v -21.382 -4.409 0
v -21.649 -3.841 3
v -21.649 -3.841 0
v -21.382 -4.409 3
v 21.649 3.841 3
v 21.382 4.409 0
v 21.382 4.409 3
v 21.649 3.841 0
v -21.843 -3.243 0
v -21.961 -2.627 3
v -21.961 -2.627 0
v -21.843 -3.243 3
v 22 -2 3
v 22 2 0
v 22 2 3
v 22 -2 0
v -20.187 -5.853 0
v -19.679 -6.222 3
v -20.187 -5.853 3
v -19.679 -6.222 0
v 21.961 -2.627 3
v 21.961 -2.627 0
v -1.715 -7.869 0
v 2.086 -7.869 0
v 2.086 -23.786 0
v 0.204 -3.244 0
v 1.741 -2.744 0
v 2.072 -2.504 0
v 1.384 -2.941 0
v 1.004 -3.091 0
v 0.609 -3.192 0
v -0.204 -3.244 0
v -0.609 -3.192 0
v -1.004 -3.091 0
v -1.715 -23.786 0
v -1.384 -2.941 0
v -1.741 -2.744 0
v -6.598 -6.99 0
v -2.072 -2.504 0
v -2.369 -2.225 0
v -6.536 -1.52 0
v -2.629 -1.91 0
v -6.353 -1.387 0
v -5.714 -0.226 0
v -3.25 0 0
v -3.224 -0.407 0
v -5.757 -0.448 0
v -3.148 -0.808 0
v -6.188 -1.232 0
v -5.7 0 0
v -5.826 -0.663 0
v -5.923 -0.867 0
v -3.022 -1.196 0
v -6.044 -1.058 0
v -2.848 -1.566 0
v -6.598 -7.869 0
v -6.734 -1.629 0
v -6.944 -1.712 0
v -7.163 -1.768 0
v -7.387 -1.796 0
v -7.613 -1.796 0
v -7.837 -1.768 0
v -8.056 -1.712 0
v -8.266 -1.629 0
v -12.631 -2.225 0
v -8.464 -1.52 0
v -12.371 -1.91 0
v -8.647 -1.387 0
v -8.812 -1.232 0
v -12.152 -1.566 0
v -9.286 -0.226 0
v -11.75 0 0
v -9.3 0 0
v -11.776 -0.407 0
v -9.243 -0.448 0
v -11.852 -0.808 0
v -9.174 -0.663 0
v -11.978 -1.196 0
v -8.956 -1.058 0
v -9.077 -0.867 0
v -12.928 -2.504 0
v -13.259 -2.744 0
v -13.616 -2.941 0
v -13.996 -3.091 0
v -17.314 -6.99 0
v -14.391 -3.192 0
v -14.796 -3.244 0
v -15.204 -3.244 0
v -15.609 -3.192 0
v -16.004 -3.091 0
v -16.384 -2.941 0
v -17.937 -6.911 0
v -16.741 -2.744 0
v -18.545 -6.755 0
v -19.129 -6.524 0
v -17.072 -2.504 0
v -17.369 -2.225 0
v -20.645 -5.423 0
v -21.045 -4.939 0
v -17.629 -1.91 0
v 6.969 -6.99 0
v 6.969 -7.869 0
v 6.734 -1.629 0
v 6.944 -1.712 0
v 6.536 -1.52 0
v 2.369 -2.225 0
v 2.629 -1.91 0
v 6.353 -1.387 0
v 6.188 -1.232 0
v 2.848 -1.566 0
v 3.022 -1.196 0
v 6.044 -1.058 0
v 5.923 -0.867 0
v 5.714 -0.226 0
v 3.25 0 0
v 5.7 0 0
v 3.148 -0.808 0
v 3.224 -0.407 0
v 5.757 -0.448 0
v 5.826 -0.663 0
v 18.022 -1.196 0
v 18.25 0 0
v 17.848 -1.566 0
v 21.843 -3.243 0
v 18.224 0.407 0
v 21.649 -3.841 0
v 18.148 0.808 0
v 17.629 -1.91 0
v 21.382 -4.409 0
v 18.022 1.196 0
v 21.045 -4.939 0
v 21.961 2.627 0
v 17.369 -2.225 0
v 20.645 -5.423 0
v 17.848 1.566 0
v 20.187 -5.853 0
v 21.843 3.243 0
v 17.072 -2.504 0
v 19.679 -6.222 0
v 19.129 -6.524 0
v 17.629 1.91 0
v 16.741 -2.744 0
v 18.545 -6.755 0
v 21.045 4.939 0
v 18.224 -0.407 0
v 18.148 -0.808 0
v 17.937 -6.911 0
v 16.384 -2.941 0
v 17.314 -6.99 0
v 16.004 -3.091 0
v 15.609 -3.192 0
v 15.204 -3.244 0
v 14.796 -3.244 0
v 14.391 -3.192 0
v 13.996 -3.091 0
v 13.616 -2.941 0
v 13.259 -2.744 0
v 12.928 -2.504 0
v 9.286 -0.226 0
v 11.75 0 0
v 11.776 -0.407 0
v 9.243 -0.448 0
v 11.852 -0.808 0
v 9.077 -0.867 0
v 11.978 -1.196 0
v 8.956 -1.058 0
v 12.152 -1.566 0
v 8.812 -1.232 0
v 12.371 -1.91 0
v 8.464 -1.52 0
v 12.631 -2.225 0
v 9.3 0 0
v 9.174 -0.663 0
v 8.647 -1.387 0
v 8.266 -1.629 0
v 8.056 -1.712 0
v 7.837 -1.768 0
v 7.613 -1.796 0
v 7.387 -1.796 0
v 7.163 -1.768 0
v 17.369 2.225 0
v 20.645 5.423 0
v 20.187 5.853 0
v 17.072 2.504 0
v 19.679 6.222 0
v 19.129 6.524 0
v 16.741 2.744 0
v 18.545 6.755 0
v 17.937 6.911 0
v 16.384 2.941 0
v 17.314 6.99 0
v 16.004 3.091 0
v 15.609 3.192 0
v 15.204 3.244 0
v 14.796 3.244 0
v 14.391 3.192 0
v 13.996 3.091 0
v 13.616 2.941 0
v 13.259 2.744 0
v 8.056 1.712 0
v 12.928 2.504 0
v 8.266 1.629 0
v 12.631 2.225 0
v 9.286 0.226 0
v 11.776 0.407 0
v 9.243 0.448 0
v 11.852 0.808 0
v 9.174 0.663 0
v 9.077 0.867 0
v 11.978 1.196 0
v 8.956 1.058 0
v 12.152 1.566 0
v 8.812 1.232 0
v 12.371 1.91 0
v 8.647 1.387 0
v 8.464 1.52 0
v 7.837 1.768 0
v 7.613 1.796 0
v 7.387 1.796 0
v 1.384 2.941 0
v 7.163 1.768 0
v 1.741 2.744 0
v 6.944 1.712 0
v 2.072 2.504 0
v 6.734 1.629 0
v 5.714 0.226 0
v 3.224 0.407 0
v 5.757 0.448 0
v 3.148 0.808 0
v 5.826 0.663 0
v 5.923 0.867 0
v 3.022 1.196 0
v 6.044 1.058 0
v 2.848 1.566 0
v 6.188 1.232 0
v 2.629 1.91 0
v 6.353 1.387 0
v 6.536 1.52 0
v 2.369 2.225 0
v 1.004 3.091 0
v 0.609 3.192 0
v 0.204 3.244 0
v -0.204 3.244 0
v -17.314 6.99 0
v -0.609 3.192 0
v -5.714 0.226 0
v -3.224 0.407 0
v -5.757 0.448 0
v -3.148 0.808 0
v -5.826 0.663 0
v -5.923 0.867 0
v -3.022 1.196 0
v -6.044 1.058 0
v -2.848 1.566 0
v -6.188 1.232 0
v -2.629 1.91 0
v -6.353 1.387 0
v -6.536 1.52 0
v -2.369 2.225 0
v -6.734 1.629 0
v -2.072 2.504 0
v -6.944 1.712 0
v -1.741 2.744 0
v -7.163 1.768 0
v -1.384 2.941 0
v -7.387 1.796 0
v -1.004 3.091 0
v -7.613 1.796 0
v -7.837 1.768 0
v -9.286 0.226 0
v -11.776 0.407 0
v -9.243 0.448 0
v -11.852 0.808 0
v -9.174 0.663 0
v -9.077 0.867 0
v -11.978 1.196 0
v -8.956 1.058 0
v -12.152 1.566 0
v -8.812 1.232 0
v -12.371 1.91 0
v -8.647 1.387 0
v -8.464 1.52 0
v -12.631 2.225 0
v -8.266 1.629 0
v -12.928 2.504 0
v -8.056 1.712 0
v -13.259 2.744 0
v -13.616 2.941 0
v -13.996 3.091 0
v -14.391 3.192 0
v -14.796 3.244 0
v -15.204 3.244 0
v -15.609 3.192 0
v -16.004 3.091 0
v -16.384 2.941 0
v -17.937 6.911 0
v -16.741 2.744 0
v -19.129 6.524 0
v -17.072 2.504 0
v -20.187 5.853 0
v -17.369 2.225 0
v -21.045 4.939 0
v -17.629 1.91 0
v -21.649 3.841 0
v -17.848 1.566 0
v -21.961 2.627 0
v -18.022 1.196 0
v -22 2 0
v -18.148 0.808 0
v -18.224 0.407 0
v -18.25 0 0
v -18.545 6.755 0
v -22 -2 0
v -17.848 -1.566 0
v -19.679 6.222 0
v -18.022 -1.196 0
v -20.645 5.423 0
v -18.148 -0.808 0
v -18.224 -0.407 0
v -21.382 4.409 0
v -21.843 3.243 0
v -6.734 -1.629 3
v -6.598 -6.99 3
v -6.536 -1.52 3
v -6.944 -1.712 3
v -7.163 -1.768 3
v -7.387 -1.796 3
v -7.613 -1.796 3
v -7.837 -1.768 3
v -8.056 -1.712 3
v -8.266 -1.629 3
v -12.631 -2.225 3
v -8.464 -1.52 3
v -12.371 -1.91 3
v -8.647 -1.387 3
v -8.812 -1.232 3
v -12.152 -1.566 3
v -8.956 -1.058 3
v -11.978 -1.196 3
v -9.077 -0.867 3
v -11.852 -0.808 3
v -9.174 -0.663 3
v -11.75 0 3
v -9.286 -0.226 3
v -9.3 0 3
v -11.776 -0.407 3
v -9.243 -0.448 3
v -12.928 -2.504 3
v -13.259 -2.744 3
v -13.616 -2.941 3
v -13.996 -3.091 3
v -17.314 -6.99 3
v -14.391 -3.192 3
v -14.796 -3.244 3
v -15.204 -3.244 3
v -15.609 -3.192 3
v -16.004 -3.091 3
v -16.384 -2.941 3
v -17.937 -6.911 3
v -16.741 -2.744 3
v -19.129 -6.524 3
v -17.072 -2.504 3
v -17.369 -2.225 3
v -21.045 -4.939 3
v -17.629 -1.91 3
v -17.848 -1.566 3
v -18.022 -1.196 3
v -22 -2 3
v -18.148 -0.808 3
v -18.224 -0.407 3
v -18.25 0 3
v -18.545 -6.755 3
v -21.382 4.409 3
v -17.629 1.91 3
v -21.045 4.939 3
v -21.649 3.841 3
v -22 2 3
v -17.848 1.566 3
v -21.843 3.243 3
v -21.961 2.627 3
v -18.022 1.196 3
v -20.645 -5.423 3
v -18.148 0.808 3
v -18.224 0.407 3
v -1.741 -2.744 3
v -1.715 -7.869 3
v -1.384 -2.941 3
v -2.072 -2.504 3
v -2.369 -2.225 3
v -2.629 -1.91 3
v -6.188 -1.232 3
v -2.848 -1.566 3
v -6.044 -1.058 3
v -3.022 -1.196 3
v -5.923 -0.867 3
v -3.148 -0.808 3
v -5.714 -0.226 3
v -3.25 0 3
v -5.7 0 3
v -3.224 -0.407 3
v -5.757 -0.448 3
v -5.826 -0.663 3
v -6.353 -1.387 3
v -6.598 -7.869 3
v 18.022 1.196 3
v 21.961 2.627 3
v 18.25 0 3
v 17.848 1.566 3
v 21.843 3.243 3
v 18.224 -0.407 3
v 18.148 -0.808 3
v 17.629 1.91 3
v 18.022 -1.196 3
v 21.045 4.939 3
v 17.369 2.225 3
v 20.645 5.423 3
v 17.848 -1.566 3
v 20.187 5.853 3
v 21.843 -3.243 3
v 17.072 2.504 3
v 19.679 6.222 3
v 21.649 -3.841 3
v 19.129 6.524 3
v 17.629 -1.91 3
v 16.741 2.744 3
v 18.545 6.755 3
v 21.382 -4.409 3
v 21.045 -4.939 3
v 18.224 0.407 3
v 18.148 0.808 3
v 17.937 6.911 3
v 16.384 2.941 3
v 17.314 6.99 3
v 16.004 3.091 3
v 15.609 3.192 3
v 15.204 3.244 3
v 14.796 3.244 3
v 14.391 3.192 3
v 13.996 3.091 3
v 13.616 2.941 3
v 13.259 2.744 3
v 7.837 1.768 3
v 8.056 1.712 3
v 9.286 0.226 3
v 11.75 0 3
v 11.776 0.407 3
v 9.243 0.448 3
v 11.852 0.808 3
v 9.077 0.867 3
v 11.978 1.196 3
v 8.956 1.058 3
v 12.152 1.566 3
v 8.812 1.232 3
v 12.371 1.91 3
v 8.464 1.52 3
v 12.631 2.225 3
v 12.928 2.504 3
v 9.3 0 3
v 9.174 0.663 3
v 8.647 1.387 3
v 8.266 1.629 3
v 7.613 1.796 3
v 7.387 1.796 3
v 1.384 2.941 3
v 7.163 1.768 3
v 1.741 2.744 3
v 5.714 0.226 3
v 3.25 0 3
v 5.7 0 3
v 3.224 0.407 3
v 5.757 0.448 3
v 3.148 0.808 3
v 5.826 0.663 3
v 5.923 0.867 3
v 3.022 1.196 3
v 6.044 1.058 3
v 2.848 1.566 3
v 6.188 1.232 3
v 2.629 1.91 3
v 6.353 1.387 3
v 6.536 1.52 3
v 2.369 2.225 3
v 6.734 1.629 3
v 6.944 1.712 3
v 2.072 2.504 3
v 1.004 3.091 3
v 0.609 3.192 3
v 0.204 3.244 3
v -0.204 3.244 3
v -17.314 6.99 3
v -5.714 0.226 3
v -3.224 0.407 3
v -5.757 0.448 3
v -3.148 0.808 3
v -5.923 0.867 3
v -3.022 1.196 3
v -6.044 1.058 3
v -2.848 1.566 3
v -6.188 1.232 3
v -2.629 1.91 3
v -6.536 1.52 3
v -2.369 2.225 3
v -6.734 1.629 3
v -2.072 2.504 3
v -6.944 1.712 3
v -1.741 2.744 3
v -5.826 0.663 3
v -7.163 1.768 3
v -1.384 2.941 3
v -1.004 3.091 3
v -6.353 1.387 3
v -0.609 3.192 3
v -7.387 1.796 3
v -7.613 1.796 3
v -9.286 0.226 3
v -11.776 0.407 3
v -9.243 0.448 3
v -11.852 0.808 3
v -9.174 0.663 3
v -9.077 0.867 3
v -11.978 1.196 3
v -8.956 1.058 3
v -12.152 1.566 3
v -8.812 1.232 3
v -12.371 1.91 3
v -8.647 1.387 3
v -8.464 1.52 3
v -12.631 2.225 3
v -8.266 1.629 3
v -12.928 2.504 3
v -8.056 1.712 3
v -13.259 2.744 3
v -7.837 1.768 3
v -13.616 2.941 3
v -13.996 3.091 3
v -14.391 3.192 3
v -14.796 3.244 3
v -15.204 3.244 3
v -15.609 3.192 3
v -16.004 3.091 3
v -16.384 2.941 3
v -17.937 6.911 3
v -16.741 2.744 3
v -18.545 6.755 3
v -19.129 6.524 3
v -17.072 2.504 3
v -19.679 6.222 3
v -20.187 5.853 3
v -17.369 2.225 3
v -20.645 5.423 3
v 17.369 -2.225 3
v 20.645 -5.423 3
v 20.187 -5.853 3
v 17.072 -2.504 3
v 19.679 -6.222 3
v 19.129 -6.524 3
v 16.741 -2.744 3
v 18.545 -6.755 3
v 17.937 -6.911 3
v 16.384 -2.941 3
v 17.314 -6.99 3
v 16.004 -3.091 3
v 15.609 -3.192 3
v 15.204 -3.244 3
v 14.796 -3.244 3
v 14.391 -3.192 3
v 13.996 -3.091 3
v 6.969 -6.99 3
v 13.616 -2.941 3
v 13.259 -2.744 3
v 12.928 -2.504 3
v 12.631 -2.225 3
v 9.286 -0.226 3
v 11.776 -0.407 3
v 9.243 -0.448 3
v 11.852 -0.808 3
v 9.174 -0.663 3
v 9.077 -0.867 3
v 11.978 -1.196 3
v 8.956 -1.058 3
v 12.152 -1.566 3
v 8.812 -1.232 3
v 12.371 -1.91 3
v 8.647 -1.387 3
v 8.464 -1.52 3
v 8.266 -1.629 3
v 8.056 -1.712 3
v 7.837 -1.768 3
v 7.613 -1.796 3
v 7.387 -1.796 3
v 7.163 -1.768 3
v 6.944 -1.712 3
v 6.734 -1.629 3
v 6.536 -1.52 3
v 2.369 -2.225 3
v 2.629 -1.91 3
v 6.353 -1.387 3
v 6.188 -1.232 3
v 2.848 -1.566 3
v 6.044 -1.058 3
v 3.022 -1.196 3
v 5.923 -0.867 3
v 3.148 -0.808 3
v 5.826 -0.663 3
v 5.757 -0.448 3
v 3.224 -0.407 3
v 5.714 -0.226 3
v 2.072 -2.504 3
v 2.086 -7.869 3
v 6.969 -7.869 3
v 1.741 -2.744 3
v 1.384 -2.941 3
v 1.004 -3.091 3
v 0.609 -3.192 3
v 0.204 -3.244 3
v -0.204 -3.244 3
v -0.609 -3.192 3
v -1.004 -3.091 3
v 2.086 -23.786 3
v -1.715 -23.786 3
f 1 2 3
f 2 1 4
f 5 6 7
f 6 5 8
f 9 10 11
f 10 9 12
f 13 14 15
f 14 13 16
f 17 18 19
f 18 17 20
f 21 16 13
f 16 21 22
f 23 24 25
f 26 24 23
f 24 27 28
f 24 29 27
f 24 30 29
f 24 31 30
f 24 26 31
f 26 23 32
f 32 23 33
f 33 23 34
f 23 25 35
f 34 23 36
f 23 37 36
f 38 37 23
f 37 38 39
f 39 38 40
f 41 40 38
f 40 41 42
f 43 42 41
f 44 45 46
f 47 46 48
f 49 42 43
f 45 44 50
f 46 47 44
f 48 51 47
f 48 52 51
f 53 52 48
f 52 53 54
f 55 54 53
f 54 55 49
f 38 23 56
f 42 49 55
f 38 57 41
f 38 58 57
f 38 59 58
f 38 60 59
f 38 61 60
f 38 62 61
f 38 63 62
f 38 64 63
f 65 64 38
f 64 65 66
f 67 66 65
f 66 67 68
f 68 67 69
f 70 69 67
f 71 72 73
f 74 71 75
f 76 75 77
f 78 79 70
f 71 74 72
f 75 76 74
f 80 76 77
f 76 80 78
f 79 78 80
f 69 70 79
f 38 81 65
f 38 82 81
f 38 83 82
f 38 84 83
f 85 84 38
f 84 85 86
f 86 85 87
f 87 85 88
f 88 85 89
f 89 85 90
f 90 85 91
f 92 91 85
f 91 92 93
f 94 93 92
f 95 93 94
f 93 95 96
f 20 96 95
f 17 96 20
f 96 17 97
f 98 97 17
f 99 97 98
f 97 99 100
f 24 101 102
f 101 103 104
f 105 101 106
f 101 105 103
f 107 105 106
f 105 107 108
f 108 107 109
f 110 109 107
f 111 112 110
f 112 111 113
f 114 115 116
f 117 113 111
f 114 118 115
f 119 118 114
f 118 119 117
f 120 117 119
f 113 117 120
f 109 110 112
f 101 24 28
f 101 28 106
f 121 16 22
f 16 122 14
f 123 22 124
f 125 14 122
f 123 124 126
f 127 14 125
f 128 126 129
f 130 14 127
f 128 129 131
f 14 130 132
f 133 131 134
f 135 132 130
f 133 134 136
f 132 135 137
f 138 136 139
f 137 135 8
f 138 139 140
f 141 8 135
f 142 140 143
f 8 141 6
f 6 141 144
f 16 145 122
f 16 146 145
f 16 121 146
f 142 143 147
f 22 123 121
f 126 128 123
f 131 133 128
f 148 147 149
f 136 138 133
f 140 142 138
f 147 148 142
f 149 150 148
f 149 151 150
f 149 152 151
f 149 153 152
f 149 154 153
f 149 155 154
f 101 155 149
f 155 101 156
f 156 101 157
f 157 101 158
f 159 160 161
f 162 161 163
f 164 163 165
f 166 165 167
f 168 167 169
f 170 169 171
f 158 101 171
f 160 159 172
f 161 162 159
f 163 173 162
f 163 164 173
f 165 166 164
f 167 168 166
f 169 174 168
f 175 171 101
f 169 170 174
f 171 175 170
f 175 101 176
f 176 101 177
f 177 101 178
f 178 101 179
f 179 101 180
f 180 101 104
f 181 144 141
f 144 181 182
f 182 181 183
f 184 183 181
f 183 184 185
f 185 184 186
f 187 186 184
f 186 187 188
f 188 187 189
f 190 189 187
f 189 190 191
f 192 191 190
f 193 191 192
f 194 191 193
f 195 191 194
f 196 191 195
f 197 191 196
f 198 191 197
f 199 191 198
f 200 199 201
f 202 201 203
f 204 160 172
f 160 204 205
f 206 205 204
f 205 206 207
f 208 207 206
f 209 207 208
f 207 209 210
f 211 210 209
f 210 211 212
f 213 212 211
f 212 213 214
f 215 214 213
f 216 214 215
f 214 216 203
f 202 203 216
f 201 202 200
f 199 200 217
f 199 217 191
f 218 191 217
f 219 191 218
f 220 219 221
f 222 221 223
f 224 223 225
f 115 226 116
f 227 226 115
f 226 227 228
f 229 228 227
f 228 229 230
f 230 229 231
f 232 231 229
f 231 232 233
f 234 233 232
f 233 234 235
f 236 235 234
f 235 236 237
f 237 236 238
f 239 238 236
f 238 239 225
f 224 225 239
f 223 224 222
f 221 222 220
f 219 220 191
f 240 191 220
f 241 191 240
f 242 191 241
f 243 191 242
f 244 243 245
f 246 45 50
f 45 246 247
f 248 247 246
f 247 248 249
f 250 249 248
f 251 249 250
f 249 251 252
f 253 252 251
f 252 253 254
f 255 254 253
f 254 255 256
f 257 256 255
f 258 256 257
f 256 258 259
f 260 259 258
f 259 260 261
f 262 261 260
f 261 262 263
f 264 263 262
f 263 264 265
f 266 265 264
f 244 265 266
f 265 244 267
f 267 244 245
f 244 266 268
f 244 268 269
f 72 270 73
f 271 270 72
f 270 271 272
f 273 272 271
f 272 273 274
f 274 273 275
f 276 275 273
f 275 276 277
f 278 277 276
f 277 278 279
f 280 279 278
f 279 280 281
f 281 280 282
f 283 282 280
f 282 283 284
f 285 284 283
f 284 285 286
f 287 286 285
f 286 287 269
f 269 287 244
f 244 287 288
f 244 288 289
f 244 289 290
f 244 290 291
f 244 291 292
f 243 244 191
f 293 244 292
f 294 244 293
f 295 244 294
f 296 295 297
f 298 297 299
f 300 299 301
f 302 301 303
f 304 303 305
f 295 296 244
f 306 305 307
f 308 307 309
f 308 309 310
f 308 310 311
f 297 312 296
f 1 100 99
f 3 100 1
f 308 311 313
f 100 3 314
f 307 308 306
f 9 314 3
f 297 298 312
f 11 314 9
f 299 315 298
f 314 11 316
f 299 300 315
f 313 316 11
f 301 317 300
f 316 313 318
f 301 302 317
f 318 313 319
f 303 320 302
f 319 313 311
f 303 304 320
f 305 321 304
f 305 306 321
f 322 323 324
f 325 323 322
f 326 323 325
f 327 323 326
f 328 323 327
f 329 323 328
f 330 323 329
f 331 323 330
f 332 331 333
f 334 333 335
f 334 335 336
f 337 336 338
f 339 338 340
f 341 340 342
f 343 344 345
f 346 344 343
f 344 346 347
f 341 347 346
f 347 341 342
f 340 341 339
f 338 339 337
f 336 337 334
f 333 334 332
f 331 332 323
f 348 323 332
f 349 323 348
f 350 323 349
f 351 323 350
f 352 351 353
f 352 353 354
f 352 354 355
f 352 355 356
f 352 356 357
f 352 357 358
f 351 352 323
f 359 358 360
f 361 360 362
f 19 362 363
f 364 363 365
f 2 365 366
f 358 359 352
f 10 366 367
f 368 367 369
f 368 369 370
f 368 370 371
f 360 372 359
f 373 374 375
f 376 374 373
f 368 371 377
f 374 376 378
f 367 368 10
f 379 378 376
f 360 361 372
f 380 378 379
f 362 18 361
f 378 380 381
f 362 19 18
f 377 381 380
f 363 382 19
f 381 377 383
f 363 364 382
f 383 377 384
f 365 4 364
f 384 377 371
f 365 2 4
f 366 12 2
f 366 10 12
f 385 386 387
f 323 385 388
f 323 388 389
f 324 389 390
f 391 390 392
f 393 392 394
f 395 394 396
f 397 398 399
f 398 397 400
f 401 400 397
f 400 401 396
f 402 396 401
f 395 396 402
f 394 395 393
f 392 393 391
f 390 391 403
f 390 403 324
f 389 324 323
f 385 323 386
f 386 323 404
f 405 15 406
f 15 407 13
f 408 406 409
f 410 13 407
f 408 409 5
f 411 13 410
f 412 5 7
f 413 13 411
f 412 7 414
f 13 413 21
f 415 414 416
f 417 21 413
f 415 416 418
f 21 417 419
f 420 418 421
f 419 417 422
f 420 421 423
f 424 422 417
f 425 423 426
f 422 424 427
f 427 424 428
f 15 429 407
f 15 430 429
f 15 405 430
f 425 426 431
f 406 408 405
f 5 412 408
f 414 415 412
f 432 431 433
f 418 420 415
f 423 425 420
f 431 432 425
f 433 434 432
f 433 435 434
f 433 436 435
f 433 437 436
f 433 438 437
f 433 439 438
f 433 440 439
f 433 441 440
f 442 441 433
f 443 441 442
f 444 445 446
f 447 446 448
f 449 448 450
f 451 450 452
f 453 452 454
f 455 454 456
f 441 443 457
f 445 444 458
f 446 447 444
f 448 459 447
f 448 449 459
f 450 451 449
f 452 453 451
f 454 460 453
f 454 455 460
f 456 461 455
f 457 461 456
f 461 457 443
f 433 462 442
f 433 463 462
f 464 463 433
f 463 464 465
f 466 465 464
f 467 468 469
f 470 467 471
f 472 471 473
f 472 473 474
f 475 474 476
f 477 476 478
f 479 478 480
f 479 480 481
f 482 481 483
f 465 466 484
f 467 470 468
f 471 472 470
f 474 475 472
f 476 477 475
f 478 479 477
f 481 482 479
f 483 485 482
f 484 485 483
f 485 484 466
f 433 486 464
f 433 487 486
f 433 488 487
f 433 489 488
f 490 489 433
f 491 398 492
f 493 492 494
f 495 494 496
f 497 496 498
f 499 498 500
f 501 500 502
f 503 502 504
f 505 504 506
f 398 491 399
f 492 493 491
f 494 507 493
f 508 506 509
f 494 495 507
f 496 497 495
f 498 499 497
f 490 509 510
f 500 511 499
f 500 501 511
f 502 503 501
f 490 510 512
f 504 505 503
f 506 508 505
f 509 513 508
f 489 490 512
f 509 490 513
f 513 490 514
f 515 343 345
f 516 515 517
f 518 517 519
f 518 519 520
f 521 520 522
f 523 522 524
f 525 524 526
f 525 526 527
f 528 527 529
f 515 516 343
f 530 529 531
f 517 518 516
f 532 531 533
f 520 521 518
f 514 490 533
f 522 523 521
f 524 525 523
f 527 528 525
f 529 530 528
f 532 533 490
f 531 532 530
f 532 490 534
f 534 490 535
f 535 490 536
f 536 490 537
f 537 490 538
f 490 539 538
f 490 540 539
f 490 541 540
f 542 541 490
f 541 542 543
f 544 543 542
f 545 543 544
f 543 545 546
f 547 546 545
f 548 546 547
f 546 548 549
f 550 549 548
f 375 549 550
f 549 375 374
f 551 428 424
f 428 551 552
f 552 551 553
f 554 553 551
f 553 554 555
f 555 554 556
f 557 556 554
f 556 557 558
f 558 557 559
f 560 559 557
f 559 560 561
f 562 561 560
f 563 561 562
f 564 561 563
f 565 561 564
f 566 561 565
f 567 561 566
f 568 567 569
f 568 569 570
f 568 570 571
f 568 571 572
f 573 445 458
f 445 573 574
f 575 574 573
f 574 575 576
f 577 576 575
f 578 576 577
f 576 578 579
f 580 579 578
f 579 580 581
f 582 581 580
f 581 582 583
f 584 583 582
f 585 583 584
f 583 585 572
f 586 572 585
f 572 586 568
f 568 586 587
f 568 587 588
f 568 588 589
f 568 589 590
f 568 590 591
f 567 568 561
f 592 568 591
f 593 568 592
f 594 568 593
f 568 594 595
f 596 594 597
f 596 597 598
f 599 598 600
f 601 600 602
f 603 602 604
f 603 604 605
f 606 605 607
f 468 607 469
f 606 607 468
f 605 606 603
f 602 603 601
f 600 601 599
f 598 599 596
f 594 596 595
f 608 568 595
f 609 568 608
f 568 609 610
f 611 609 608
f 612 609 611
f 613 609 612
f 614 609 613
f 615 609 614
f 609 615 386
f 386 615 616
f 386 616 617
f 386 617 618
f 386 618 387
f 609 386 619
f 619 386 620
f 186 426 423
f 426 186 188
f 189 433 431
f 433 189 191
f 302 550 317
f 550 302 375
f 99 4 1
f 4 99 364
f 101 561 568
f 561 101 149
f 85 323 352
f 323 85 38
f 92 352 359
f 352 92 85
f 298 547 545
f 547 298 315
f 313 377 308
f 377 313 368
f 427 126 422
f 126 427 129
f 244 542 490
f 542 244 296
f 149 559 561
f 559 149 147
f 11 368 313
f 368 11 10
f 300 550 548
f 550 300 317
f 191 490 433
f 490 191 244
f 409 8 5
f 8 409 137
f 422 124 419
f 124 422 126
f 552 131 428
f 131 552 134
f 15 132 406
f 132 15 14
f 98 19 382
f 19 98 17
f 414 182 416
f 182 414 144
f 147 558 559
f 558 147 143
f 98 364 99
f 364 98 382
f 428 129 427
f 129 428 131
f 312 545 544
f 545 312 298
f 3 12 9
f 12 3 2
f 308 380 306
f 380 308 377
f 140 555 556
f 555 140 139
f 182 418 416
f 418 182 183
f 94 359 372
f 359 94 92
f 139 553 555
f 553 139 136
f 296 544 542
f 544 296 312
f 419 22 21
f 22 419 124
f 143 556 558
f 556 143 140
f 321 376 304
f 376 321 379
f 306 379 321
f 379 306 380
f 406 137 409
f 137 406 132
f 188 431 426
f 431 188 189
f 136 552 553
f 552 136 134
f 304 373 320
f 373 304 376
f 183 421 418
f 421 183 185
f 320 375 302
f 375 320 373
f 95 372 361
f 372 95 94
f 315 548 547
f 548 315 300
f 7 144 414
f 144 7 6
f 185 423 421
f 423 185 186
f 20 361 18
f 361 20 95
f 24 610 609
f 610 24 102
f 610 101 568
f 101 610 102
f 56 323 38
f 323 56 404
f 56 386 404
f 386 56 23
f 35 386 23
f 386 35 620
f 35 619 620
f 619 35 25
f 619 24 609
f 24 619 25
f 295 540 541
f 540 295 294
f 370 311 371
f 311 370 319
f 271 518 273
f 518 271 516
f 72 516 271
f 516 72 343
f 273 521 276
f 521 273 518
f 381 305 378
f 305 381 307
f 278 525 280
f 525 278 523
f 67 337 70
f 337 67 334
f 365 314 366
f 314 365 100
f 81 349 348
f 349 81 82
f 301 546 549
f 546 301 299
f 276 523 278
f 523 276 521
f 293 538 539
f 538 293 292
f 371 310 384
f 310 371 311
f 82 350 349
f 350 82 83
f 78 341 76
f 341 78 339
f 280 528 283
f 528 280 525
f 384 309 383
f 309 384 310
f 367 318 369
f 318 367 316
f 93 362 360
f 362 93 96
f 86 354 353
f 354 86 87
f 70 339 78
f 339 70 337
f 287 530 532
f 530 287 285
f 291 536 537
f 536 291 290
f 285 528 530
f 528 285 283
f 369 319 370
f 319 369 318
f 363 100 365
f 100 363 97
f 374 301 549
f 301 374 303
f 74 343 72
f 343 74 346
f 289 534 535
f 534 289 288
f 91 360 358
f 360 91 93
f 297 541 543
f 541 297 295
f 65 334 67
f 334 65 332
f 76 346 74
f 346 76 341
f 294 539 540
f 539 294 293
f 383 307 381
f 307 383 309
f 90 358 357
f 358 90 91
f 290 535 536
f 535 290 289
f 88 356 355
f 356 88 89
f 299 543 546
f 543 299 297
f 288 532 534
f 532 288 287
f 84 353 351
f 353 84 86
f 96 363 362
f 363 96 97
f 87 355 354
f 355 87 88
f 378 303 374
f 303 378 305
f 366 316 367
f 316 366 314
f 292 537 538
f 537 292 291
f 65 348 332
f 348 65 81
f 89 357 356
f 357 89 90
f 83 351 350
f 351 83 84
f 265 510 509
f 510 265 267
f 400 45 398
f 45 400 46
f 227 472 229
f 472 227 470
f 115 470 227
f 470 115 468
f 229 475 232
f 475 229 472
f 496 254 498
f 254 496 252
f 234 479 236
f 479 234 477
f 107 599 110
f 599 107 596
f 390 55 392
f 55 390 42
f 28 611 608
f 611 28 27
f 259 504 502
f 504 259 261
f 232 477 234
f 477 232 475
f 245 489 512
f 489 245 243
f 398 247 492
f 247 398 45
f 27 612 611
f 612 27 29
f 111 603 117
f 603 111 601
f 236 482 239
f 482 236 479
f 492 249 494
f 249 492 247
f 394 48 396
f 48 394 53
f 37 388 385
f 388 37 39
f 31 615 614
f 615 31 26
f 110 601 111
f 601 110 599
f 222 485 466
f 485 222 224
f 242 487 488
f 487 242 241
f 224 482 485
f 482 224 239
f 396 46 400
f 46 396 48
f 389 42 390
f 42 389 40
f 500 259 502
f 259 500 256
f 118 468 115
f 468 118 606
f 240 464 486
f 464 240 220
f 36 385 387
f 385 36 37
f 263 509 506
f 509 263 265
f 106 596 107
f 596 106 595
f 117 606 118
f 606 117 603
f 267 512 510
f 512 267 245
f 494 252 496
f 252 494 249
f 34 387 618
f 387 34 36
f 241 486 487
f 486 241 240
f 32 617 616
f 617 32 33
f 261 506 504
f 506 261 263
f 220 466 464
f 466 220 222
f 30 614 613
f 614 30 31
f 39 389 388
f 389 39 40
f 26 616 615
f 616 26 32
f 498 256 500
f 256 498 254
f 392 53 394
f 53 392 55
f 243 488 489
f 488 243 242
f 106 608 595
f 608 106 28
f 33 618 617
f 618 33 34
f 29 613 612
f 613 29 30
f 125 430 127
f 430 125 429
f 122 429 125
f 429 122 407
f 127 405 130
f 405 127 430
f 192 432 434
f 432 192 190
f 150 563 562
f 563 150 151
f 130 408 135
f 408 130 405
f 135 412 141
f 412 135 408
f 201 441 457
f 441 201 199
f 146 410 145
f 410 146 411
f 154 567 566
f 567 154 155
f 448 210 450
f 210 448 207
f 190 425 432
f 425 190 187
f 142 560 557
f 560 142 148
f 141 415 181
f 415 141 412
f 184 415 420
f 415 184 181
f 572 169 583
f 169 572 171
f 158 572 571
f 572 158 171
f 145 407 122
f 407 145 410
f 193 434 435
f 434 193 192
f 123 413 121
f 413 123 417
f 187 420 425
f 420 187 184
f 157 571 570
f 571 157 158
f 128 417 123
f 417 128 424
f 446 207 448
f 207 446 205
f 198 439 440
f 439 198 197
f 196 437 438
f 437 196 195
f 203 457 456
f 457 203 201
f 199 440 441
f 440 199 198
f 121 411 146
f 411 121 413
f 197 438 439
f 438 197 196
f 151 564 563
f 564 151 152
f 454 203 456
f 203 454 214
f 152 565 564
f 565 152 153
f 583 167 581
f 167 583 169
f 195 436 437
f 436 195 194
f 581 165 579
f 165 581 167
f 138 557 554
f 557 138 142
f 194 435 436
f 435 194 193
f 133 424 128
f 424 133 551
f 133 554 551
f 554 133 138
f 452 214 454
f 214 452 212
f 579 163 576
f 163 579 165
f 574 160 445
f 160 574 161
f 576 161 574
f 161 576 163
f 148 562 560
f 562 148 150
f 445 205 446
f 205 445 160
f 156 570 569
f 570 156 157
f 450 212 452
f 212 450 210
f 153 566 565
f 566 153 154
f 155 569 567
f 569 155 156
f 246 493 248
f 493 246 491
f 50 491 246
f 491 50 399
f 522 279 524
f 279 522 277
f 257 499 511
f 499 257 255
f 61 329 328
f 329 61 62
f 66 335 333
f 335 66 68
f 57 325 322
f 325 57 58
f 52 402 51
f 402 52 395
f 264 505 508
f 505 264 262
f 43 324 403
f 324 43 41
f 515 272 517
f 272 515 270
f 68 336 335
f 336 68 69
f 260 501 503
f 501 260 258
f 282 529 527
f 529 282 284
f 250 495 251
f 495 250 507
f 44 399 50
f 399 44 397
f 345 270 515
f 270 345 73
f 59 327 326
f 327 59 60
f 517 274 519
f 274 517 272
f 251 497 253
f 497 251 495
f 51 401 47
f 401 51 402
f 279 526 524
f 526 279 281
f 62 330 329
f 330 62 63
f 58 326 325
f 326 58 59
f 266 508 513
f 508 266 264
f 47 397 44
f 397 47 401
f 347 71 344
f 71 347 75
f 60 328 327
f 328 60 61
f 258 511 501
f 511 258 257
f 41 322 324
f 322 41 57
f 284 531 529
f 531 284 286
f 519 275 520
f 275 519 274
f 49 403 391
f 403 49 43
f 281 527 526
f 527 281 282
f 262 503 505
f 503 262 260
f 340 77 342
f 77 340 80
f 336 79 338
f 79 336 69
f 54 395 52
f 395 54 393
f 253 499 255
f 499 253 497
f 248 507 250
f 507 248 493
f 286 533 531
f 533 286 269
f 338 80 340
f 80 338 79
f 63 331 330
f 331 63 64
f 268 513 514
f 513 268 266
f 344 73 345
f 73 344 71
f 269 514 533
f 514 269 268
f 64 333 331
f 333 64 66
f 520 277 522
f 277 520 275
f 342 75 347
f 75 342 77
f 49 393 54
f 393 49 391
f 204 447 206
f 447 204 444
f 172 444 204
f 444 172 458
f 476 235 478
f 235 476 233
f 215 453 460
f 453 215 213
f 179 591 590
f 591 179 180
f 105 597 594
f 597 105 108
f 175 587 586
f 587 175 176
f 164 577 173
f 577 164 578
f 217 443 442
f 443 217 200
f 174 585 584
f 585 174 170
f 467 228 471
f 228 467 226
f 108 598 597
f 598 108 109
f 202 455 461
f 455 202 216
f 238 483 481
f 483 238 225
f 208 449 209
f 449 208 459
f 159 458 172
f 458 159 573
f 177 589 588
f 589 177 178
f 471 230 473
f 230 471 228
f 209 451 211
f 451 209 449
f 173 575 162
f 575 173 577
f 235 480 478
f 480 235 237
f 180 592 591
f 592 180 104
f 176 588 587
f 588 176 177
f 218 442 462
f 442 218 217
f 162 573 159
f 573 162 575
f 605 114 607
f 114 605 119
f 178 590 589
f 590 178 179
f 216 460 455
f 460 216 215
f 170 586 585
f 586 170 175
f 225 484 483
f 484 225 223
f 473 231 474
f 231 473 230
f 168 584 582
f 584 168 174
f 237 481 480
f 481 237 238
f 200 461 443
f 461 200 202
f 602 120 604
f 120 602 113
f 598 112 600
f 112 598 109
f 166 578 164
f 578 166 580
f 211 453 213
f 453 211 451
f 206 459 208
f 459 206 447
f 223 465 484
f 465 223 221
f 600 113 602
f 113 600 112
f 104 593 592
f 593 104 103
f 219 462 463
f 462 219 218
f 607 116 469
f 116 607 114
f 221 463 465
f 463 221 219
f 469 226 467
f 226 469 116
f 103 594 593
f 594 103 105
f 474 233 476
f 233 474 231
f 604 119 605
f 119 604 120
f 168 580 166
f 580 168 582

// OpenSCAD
$fn = 50;


difference() {
	union() {
		hull() {
			translate(v = [-17.0000000000, 2.0000000000, 0]) {
				cylinder(h = 3, r = 5);
			}
			translate(v = [17.0000000000, 2.0000000000, 0]) {
				cylinder(h = 3, r = 5);
			}
			translate(v = [-17.0000000000, -2.0000000000, 0]) {
				cylinder(h = 3, r = 5);
			}
			translate(v = [17.0000000000, -2.0000000000, 0]) {
				cylinder(h = 3, r = 5);
			}
		}
		translate(v = [0, -5, 0]) {
			linear_extrude(height = 3) {
				text(font = "DejaVu Sans Mono:style=Bold", halign = "center", size = 19.0000000000, text = "T", valign = "top");
			}
		}
	}
	union() {
		translate(v = [-15.0000000000, 0.0000000000, 0]) {
			translate(v = [0, 0, -100]) {
				cylinder(h = 200, r = 3.2500000000);
			}
		}
		translate(v = [0, 0, -100]) {
			cylinder(h = 200, r = 3.2500000000);
		}
		translate(v = [15.0000000000, 0.0000000000, 0]) {
			translate(v = [0, 0, -100]) {
				cylinder(h = 200, r = 3.2500000000);
			}
		}
		translate(v = [-15.0000000000, 0.0000000000, 0]) {
			translate(v = [0, 0, -100]) {
				cylinder(h = 200, r = 1.8000000000);
			}
		}
		translate(v = [-7.5000000000, 0.0000000000, 0]) {
			translate(v = [0, 0, -100]) {
				cylinder(h = 200, r = 1.8000000000);
			}
		}
		translate(v = [0, 0, -100]) {
			cylinder(h = 200, r = 1.8000000000);
		}
		translate(v = [7.5000000000, 0.0000000000, 0]) {
			translate(v = [0, 0, -100]) {
				cylinder(h = 200, r = 1.8000000000);
			}
		}
		translate(v = [15.0000000000, 0.0000000000, 0]) {
			translate(v = [0, 0, -100]) {
				cylinder(h = 200, r = 1.8000000000);
			}
		}
	}
}
